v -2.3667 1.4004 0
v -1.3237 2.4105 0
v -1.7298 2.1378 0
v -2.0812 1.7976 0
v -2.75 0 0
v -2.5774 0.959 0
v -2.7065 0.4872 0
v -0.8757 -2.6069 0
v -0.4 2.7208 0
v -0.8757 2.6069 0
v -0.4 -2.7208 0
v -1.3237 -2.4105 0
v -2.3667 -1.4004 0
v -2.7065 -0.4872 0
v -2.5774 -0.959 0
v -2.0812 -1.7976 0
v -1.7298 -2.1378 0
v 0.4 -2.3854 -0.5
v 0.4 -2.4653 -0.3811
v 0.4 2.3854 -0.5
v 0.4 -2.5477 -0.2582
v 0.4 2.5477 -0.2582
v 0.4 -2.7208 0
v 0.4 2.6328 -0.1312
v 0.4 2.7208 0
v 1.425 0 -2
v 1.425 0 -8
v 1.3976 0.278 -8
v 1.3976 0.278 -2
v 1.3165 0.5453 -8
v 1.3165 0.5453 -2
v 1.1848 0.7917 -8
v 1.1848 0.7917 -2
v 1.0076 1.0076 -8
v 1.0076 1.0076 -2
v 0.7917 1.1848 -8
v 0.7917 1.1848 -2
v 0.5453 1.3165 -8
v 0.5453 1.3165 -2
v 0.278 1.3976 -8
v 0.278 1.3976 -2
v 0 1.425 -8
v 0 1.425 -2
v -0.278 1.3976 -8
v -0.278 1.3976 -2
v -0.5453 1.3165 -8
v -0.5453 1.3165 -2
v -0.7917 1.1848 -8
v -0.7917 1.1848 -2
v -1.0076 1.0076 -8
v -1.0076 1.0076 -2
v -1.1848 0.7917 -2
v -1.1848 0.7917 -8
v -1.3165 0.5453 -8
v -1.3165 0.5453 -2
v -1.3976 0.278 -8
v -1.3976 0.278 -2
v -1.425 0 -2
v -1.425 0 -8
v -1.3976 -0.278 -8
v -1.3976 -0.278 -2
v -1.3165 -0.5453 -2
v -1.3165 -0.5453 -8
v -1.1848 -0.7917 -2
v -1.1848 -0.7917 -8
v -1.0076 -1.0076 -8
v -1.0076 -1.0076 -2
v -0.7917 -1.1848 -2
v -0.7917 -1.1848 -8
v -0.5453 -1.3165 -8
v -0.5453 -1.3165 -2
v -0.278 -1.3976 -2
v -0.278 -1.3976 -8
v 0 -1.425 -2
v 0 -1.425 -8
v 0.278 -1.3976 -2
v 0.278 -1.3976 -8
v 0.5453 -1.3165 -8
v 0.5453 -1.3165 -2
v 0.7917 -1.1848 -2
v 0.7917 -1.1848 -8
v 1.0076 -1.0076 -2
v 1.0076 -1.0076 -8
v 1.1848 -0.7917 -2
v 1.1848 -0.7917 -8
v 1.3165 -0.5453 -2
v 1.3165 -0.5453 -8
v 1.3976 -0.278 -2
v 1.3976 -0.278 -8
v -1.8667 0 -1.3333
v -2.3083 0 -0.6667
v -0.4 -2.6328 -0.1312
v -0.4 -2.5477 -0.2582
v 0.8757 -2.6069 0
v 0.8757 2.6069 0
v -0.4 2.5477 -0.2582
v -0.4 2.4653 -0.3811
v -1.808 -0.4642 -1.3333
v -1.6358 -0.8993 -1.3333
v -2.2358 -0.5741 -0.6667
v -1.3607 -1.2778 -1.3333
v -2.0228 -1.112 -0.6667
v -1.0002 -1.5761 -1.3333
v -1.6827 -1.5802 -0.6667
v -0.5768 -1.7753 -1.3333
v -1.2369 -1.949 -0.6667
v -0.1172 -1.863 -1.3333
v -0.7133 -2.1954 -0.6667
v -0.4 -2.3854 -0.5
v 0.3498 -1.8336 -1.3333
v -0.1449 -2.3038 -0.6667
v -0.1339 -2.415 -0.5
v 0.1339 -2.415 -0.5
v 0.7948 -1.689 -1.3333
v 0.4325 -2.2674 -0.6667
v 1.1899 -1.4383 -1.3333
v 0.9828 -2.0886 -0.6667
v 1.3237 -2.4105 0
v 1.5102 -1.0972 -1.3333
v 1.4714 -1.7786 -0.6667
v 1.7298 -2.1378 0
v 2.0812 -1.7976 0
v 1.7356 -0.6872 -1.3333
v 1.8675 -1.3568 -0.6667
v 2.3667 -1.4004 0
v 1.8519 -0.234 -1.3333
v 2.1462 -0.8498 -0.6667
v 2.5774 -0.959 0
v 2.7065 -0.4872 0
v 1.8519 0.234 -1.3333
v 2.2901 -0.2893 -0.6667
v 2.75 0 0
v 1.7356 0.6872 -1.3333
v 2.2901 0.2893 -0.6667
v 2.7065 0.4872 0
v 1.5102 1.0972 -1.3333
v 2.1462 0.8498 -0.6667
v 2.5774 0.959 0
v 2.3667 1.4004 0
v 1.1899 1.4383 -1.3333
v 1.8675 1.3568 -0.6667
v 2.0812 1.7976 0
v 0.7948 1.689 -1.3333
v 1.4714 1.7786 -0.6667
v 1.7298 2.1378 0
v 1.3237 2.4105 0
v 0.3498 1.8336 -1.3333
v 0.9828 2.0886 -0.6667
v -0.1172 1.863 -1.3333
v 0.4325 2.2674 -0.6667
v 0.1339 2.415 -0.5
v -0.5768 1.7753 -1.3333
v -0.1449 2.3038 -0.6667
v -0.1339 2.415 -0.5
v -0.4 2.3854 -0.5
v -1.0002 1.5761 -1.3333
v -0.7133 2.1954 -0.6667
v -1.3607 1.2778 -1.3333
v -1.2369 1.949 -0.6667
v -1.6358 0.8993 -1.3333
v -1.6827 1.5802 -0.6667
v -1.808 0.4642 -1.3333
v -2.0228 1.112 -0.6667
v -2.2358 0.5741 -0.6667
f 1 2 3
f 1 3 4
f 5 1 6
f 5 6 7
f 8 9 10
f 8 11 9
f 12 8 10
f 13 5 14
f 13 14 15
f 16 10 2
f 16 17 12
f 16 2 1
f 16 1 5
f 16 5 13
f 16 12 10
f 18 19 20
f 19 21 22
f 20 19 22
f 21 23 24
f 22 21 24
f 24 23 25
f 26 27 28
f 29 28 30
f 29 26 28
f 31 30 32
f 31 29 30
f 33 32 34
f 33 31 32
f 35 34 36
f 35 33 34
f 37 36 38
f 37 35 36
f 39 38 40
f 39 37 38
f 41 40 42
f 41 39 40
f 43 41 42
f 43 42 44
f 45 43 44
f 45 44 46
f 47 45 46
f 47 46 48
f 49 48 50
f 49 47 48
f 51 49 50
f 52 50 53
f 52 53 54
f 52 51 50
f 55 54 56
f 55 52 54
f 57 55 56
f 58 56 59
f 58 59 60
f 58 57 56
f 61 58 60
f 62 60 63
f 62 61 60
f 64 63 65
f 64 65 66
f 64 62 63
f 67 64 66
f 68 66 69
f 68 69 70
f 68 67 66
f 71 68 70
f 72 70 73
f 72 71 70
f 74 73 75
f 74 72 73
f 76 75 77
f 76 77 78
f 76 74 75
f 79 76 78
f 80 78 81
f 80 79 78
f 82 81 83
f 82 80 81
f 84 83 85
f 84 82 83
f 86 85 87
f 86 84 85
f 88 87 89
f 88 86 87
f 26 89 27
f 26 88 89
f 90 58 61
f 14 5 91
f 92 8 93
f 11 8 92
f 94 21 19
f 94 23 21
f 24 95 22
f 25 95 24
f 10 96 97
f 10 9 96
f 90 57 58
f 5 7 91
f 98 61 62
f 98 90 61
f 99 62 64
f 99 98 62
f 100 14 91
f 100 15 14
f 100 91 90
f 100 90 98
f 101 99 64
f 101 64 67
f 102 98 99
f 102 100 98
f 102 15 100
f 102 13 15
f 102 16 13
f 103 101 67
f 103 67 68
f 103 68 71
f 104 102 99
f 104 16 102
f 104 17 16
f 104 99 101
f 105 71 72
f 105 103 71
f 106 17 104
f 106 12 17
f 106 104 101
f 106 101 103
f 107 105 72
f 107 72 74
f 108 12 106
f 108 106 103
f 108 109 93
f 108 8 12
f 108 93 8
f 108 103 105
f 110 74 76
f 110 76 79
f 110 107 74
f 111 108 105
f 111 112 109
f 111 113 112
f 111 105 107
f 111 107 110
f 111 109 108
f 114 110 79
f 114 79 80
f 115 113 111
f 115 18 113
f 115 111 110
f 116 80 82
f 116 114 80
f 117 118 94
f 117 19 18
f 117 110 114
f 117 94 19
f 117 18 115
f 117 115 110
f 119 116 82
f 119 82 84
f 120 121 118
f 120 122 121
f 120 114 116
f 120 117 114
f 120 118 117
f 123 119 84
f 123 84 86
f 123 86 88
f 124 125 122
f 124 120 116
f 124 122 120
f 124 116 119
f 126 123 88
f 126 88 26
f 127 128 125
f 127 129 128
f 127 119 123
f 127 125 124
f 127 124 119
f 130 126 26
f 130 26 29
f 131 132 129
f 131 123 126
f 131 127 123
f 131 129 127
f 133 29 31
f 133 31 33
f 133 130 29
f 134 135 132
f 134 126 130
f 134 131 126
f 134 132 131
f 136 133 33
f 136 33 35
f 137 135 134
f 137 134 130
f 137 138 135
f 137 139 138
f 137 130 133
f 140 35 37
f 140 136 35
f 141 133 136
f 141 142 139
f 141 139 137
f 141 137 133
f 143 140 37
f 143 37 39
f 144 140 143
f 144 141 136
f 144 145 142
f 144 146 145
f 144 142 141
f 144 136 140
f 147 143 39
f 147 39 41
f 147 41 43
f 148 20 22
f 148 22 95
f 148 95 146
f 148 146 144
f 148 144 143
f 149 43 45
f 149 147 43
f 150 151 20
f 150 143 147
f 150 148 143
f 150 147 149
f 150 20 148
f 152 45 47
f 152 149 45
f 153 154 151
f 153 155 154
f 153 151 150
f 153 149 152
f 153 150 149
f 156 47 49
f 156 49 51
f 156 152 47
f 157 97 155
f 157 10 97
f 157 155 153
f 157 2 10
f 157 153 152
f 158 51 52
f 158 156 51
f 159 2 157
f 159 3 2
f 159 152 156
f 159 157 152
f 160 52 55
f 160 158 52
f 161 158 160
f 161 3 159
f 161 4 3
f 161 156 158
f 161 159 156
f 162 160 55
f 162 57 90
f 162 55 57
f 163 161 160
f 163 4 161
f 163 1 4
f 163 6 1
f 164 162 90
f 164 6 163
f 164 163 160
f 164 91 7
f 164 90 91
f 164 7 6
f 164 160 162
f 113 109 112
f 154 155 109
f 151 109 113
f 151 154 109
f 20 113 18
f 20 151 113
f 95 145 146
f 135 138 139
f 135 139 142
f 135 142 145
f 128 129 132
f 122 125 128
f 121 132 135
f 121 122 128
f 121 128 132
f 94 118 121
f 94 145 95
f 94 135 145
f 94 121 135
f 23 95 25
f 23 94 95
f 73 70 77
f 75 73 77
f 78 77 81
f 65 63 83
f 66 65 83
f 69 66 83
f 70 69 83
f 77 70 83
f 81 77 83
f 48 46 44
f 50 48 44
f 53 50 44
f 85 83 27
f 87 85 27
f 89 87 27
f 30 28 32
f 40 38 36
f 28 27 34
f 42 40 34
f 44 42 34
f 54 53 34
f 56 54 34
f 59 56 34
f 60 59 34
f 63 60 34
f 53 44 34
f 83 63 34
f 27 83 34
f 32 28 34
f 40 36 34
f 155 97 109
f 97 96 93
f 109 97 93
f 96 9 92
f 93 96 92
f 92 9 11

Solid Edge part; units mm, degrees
sketch "Sketch1" plane through (0, 0, 0) normal (0, 0, 1) x (1, 0, 0)
  circle A0 centre (0, 0) radius 1.425
extrude "Protrusion1" add sketch "Sketch1" against normal blind 8
sketch "Sketch2" plane through (0, 0, 0) normal (0, -1, 0) x (1, 0, 0)
  line L0 (-1.425, -2) -> (-2.75, 0)
  line L1 (-2.75, 0) -> (0, 0)
  line L2 (-1.425, -2) -> (-1.425, 0)
revolve "RevolvedProtrusion1" add sketch "Sketch2" angle 360 about axis through (0, 0, 0) along (0, 0, 1) material side at (-2.0458, 0, -0.9724)
sketch "Sketch3" plane through (0, 0, 0) normal (0, 0, 1) x (0, -1, 0)
  line L0 (-3.7678, -0.4) -> (3.7678, -0.4)
  line L1 (3.7678, -0.4) -> (3.7678, 0.4)
  line L2 (3.7678, 0.4) -> (-3.7678, 0.4)
  line L3 (-3.7678, 0.4) -> (-3.7678, -0.4)
extrude "ExtrudedCutout_1" cut sketch "Sketch3" against normal blind 0.5
properties material "Graphite"
